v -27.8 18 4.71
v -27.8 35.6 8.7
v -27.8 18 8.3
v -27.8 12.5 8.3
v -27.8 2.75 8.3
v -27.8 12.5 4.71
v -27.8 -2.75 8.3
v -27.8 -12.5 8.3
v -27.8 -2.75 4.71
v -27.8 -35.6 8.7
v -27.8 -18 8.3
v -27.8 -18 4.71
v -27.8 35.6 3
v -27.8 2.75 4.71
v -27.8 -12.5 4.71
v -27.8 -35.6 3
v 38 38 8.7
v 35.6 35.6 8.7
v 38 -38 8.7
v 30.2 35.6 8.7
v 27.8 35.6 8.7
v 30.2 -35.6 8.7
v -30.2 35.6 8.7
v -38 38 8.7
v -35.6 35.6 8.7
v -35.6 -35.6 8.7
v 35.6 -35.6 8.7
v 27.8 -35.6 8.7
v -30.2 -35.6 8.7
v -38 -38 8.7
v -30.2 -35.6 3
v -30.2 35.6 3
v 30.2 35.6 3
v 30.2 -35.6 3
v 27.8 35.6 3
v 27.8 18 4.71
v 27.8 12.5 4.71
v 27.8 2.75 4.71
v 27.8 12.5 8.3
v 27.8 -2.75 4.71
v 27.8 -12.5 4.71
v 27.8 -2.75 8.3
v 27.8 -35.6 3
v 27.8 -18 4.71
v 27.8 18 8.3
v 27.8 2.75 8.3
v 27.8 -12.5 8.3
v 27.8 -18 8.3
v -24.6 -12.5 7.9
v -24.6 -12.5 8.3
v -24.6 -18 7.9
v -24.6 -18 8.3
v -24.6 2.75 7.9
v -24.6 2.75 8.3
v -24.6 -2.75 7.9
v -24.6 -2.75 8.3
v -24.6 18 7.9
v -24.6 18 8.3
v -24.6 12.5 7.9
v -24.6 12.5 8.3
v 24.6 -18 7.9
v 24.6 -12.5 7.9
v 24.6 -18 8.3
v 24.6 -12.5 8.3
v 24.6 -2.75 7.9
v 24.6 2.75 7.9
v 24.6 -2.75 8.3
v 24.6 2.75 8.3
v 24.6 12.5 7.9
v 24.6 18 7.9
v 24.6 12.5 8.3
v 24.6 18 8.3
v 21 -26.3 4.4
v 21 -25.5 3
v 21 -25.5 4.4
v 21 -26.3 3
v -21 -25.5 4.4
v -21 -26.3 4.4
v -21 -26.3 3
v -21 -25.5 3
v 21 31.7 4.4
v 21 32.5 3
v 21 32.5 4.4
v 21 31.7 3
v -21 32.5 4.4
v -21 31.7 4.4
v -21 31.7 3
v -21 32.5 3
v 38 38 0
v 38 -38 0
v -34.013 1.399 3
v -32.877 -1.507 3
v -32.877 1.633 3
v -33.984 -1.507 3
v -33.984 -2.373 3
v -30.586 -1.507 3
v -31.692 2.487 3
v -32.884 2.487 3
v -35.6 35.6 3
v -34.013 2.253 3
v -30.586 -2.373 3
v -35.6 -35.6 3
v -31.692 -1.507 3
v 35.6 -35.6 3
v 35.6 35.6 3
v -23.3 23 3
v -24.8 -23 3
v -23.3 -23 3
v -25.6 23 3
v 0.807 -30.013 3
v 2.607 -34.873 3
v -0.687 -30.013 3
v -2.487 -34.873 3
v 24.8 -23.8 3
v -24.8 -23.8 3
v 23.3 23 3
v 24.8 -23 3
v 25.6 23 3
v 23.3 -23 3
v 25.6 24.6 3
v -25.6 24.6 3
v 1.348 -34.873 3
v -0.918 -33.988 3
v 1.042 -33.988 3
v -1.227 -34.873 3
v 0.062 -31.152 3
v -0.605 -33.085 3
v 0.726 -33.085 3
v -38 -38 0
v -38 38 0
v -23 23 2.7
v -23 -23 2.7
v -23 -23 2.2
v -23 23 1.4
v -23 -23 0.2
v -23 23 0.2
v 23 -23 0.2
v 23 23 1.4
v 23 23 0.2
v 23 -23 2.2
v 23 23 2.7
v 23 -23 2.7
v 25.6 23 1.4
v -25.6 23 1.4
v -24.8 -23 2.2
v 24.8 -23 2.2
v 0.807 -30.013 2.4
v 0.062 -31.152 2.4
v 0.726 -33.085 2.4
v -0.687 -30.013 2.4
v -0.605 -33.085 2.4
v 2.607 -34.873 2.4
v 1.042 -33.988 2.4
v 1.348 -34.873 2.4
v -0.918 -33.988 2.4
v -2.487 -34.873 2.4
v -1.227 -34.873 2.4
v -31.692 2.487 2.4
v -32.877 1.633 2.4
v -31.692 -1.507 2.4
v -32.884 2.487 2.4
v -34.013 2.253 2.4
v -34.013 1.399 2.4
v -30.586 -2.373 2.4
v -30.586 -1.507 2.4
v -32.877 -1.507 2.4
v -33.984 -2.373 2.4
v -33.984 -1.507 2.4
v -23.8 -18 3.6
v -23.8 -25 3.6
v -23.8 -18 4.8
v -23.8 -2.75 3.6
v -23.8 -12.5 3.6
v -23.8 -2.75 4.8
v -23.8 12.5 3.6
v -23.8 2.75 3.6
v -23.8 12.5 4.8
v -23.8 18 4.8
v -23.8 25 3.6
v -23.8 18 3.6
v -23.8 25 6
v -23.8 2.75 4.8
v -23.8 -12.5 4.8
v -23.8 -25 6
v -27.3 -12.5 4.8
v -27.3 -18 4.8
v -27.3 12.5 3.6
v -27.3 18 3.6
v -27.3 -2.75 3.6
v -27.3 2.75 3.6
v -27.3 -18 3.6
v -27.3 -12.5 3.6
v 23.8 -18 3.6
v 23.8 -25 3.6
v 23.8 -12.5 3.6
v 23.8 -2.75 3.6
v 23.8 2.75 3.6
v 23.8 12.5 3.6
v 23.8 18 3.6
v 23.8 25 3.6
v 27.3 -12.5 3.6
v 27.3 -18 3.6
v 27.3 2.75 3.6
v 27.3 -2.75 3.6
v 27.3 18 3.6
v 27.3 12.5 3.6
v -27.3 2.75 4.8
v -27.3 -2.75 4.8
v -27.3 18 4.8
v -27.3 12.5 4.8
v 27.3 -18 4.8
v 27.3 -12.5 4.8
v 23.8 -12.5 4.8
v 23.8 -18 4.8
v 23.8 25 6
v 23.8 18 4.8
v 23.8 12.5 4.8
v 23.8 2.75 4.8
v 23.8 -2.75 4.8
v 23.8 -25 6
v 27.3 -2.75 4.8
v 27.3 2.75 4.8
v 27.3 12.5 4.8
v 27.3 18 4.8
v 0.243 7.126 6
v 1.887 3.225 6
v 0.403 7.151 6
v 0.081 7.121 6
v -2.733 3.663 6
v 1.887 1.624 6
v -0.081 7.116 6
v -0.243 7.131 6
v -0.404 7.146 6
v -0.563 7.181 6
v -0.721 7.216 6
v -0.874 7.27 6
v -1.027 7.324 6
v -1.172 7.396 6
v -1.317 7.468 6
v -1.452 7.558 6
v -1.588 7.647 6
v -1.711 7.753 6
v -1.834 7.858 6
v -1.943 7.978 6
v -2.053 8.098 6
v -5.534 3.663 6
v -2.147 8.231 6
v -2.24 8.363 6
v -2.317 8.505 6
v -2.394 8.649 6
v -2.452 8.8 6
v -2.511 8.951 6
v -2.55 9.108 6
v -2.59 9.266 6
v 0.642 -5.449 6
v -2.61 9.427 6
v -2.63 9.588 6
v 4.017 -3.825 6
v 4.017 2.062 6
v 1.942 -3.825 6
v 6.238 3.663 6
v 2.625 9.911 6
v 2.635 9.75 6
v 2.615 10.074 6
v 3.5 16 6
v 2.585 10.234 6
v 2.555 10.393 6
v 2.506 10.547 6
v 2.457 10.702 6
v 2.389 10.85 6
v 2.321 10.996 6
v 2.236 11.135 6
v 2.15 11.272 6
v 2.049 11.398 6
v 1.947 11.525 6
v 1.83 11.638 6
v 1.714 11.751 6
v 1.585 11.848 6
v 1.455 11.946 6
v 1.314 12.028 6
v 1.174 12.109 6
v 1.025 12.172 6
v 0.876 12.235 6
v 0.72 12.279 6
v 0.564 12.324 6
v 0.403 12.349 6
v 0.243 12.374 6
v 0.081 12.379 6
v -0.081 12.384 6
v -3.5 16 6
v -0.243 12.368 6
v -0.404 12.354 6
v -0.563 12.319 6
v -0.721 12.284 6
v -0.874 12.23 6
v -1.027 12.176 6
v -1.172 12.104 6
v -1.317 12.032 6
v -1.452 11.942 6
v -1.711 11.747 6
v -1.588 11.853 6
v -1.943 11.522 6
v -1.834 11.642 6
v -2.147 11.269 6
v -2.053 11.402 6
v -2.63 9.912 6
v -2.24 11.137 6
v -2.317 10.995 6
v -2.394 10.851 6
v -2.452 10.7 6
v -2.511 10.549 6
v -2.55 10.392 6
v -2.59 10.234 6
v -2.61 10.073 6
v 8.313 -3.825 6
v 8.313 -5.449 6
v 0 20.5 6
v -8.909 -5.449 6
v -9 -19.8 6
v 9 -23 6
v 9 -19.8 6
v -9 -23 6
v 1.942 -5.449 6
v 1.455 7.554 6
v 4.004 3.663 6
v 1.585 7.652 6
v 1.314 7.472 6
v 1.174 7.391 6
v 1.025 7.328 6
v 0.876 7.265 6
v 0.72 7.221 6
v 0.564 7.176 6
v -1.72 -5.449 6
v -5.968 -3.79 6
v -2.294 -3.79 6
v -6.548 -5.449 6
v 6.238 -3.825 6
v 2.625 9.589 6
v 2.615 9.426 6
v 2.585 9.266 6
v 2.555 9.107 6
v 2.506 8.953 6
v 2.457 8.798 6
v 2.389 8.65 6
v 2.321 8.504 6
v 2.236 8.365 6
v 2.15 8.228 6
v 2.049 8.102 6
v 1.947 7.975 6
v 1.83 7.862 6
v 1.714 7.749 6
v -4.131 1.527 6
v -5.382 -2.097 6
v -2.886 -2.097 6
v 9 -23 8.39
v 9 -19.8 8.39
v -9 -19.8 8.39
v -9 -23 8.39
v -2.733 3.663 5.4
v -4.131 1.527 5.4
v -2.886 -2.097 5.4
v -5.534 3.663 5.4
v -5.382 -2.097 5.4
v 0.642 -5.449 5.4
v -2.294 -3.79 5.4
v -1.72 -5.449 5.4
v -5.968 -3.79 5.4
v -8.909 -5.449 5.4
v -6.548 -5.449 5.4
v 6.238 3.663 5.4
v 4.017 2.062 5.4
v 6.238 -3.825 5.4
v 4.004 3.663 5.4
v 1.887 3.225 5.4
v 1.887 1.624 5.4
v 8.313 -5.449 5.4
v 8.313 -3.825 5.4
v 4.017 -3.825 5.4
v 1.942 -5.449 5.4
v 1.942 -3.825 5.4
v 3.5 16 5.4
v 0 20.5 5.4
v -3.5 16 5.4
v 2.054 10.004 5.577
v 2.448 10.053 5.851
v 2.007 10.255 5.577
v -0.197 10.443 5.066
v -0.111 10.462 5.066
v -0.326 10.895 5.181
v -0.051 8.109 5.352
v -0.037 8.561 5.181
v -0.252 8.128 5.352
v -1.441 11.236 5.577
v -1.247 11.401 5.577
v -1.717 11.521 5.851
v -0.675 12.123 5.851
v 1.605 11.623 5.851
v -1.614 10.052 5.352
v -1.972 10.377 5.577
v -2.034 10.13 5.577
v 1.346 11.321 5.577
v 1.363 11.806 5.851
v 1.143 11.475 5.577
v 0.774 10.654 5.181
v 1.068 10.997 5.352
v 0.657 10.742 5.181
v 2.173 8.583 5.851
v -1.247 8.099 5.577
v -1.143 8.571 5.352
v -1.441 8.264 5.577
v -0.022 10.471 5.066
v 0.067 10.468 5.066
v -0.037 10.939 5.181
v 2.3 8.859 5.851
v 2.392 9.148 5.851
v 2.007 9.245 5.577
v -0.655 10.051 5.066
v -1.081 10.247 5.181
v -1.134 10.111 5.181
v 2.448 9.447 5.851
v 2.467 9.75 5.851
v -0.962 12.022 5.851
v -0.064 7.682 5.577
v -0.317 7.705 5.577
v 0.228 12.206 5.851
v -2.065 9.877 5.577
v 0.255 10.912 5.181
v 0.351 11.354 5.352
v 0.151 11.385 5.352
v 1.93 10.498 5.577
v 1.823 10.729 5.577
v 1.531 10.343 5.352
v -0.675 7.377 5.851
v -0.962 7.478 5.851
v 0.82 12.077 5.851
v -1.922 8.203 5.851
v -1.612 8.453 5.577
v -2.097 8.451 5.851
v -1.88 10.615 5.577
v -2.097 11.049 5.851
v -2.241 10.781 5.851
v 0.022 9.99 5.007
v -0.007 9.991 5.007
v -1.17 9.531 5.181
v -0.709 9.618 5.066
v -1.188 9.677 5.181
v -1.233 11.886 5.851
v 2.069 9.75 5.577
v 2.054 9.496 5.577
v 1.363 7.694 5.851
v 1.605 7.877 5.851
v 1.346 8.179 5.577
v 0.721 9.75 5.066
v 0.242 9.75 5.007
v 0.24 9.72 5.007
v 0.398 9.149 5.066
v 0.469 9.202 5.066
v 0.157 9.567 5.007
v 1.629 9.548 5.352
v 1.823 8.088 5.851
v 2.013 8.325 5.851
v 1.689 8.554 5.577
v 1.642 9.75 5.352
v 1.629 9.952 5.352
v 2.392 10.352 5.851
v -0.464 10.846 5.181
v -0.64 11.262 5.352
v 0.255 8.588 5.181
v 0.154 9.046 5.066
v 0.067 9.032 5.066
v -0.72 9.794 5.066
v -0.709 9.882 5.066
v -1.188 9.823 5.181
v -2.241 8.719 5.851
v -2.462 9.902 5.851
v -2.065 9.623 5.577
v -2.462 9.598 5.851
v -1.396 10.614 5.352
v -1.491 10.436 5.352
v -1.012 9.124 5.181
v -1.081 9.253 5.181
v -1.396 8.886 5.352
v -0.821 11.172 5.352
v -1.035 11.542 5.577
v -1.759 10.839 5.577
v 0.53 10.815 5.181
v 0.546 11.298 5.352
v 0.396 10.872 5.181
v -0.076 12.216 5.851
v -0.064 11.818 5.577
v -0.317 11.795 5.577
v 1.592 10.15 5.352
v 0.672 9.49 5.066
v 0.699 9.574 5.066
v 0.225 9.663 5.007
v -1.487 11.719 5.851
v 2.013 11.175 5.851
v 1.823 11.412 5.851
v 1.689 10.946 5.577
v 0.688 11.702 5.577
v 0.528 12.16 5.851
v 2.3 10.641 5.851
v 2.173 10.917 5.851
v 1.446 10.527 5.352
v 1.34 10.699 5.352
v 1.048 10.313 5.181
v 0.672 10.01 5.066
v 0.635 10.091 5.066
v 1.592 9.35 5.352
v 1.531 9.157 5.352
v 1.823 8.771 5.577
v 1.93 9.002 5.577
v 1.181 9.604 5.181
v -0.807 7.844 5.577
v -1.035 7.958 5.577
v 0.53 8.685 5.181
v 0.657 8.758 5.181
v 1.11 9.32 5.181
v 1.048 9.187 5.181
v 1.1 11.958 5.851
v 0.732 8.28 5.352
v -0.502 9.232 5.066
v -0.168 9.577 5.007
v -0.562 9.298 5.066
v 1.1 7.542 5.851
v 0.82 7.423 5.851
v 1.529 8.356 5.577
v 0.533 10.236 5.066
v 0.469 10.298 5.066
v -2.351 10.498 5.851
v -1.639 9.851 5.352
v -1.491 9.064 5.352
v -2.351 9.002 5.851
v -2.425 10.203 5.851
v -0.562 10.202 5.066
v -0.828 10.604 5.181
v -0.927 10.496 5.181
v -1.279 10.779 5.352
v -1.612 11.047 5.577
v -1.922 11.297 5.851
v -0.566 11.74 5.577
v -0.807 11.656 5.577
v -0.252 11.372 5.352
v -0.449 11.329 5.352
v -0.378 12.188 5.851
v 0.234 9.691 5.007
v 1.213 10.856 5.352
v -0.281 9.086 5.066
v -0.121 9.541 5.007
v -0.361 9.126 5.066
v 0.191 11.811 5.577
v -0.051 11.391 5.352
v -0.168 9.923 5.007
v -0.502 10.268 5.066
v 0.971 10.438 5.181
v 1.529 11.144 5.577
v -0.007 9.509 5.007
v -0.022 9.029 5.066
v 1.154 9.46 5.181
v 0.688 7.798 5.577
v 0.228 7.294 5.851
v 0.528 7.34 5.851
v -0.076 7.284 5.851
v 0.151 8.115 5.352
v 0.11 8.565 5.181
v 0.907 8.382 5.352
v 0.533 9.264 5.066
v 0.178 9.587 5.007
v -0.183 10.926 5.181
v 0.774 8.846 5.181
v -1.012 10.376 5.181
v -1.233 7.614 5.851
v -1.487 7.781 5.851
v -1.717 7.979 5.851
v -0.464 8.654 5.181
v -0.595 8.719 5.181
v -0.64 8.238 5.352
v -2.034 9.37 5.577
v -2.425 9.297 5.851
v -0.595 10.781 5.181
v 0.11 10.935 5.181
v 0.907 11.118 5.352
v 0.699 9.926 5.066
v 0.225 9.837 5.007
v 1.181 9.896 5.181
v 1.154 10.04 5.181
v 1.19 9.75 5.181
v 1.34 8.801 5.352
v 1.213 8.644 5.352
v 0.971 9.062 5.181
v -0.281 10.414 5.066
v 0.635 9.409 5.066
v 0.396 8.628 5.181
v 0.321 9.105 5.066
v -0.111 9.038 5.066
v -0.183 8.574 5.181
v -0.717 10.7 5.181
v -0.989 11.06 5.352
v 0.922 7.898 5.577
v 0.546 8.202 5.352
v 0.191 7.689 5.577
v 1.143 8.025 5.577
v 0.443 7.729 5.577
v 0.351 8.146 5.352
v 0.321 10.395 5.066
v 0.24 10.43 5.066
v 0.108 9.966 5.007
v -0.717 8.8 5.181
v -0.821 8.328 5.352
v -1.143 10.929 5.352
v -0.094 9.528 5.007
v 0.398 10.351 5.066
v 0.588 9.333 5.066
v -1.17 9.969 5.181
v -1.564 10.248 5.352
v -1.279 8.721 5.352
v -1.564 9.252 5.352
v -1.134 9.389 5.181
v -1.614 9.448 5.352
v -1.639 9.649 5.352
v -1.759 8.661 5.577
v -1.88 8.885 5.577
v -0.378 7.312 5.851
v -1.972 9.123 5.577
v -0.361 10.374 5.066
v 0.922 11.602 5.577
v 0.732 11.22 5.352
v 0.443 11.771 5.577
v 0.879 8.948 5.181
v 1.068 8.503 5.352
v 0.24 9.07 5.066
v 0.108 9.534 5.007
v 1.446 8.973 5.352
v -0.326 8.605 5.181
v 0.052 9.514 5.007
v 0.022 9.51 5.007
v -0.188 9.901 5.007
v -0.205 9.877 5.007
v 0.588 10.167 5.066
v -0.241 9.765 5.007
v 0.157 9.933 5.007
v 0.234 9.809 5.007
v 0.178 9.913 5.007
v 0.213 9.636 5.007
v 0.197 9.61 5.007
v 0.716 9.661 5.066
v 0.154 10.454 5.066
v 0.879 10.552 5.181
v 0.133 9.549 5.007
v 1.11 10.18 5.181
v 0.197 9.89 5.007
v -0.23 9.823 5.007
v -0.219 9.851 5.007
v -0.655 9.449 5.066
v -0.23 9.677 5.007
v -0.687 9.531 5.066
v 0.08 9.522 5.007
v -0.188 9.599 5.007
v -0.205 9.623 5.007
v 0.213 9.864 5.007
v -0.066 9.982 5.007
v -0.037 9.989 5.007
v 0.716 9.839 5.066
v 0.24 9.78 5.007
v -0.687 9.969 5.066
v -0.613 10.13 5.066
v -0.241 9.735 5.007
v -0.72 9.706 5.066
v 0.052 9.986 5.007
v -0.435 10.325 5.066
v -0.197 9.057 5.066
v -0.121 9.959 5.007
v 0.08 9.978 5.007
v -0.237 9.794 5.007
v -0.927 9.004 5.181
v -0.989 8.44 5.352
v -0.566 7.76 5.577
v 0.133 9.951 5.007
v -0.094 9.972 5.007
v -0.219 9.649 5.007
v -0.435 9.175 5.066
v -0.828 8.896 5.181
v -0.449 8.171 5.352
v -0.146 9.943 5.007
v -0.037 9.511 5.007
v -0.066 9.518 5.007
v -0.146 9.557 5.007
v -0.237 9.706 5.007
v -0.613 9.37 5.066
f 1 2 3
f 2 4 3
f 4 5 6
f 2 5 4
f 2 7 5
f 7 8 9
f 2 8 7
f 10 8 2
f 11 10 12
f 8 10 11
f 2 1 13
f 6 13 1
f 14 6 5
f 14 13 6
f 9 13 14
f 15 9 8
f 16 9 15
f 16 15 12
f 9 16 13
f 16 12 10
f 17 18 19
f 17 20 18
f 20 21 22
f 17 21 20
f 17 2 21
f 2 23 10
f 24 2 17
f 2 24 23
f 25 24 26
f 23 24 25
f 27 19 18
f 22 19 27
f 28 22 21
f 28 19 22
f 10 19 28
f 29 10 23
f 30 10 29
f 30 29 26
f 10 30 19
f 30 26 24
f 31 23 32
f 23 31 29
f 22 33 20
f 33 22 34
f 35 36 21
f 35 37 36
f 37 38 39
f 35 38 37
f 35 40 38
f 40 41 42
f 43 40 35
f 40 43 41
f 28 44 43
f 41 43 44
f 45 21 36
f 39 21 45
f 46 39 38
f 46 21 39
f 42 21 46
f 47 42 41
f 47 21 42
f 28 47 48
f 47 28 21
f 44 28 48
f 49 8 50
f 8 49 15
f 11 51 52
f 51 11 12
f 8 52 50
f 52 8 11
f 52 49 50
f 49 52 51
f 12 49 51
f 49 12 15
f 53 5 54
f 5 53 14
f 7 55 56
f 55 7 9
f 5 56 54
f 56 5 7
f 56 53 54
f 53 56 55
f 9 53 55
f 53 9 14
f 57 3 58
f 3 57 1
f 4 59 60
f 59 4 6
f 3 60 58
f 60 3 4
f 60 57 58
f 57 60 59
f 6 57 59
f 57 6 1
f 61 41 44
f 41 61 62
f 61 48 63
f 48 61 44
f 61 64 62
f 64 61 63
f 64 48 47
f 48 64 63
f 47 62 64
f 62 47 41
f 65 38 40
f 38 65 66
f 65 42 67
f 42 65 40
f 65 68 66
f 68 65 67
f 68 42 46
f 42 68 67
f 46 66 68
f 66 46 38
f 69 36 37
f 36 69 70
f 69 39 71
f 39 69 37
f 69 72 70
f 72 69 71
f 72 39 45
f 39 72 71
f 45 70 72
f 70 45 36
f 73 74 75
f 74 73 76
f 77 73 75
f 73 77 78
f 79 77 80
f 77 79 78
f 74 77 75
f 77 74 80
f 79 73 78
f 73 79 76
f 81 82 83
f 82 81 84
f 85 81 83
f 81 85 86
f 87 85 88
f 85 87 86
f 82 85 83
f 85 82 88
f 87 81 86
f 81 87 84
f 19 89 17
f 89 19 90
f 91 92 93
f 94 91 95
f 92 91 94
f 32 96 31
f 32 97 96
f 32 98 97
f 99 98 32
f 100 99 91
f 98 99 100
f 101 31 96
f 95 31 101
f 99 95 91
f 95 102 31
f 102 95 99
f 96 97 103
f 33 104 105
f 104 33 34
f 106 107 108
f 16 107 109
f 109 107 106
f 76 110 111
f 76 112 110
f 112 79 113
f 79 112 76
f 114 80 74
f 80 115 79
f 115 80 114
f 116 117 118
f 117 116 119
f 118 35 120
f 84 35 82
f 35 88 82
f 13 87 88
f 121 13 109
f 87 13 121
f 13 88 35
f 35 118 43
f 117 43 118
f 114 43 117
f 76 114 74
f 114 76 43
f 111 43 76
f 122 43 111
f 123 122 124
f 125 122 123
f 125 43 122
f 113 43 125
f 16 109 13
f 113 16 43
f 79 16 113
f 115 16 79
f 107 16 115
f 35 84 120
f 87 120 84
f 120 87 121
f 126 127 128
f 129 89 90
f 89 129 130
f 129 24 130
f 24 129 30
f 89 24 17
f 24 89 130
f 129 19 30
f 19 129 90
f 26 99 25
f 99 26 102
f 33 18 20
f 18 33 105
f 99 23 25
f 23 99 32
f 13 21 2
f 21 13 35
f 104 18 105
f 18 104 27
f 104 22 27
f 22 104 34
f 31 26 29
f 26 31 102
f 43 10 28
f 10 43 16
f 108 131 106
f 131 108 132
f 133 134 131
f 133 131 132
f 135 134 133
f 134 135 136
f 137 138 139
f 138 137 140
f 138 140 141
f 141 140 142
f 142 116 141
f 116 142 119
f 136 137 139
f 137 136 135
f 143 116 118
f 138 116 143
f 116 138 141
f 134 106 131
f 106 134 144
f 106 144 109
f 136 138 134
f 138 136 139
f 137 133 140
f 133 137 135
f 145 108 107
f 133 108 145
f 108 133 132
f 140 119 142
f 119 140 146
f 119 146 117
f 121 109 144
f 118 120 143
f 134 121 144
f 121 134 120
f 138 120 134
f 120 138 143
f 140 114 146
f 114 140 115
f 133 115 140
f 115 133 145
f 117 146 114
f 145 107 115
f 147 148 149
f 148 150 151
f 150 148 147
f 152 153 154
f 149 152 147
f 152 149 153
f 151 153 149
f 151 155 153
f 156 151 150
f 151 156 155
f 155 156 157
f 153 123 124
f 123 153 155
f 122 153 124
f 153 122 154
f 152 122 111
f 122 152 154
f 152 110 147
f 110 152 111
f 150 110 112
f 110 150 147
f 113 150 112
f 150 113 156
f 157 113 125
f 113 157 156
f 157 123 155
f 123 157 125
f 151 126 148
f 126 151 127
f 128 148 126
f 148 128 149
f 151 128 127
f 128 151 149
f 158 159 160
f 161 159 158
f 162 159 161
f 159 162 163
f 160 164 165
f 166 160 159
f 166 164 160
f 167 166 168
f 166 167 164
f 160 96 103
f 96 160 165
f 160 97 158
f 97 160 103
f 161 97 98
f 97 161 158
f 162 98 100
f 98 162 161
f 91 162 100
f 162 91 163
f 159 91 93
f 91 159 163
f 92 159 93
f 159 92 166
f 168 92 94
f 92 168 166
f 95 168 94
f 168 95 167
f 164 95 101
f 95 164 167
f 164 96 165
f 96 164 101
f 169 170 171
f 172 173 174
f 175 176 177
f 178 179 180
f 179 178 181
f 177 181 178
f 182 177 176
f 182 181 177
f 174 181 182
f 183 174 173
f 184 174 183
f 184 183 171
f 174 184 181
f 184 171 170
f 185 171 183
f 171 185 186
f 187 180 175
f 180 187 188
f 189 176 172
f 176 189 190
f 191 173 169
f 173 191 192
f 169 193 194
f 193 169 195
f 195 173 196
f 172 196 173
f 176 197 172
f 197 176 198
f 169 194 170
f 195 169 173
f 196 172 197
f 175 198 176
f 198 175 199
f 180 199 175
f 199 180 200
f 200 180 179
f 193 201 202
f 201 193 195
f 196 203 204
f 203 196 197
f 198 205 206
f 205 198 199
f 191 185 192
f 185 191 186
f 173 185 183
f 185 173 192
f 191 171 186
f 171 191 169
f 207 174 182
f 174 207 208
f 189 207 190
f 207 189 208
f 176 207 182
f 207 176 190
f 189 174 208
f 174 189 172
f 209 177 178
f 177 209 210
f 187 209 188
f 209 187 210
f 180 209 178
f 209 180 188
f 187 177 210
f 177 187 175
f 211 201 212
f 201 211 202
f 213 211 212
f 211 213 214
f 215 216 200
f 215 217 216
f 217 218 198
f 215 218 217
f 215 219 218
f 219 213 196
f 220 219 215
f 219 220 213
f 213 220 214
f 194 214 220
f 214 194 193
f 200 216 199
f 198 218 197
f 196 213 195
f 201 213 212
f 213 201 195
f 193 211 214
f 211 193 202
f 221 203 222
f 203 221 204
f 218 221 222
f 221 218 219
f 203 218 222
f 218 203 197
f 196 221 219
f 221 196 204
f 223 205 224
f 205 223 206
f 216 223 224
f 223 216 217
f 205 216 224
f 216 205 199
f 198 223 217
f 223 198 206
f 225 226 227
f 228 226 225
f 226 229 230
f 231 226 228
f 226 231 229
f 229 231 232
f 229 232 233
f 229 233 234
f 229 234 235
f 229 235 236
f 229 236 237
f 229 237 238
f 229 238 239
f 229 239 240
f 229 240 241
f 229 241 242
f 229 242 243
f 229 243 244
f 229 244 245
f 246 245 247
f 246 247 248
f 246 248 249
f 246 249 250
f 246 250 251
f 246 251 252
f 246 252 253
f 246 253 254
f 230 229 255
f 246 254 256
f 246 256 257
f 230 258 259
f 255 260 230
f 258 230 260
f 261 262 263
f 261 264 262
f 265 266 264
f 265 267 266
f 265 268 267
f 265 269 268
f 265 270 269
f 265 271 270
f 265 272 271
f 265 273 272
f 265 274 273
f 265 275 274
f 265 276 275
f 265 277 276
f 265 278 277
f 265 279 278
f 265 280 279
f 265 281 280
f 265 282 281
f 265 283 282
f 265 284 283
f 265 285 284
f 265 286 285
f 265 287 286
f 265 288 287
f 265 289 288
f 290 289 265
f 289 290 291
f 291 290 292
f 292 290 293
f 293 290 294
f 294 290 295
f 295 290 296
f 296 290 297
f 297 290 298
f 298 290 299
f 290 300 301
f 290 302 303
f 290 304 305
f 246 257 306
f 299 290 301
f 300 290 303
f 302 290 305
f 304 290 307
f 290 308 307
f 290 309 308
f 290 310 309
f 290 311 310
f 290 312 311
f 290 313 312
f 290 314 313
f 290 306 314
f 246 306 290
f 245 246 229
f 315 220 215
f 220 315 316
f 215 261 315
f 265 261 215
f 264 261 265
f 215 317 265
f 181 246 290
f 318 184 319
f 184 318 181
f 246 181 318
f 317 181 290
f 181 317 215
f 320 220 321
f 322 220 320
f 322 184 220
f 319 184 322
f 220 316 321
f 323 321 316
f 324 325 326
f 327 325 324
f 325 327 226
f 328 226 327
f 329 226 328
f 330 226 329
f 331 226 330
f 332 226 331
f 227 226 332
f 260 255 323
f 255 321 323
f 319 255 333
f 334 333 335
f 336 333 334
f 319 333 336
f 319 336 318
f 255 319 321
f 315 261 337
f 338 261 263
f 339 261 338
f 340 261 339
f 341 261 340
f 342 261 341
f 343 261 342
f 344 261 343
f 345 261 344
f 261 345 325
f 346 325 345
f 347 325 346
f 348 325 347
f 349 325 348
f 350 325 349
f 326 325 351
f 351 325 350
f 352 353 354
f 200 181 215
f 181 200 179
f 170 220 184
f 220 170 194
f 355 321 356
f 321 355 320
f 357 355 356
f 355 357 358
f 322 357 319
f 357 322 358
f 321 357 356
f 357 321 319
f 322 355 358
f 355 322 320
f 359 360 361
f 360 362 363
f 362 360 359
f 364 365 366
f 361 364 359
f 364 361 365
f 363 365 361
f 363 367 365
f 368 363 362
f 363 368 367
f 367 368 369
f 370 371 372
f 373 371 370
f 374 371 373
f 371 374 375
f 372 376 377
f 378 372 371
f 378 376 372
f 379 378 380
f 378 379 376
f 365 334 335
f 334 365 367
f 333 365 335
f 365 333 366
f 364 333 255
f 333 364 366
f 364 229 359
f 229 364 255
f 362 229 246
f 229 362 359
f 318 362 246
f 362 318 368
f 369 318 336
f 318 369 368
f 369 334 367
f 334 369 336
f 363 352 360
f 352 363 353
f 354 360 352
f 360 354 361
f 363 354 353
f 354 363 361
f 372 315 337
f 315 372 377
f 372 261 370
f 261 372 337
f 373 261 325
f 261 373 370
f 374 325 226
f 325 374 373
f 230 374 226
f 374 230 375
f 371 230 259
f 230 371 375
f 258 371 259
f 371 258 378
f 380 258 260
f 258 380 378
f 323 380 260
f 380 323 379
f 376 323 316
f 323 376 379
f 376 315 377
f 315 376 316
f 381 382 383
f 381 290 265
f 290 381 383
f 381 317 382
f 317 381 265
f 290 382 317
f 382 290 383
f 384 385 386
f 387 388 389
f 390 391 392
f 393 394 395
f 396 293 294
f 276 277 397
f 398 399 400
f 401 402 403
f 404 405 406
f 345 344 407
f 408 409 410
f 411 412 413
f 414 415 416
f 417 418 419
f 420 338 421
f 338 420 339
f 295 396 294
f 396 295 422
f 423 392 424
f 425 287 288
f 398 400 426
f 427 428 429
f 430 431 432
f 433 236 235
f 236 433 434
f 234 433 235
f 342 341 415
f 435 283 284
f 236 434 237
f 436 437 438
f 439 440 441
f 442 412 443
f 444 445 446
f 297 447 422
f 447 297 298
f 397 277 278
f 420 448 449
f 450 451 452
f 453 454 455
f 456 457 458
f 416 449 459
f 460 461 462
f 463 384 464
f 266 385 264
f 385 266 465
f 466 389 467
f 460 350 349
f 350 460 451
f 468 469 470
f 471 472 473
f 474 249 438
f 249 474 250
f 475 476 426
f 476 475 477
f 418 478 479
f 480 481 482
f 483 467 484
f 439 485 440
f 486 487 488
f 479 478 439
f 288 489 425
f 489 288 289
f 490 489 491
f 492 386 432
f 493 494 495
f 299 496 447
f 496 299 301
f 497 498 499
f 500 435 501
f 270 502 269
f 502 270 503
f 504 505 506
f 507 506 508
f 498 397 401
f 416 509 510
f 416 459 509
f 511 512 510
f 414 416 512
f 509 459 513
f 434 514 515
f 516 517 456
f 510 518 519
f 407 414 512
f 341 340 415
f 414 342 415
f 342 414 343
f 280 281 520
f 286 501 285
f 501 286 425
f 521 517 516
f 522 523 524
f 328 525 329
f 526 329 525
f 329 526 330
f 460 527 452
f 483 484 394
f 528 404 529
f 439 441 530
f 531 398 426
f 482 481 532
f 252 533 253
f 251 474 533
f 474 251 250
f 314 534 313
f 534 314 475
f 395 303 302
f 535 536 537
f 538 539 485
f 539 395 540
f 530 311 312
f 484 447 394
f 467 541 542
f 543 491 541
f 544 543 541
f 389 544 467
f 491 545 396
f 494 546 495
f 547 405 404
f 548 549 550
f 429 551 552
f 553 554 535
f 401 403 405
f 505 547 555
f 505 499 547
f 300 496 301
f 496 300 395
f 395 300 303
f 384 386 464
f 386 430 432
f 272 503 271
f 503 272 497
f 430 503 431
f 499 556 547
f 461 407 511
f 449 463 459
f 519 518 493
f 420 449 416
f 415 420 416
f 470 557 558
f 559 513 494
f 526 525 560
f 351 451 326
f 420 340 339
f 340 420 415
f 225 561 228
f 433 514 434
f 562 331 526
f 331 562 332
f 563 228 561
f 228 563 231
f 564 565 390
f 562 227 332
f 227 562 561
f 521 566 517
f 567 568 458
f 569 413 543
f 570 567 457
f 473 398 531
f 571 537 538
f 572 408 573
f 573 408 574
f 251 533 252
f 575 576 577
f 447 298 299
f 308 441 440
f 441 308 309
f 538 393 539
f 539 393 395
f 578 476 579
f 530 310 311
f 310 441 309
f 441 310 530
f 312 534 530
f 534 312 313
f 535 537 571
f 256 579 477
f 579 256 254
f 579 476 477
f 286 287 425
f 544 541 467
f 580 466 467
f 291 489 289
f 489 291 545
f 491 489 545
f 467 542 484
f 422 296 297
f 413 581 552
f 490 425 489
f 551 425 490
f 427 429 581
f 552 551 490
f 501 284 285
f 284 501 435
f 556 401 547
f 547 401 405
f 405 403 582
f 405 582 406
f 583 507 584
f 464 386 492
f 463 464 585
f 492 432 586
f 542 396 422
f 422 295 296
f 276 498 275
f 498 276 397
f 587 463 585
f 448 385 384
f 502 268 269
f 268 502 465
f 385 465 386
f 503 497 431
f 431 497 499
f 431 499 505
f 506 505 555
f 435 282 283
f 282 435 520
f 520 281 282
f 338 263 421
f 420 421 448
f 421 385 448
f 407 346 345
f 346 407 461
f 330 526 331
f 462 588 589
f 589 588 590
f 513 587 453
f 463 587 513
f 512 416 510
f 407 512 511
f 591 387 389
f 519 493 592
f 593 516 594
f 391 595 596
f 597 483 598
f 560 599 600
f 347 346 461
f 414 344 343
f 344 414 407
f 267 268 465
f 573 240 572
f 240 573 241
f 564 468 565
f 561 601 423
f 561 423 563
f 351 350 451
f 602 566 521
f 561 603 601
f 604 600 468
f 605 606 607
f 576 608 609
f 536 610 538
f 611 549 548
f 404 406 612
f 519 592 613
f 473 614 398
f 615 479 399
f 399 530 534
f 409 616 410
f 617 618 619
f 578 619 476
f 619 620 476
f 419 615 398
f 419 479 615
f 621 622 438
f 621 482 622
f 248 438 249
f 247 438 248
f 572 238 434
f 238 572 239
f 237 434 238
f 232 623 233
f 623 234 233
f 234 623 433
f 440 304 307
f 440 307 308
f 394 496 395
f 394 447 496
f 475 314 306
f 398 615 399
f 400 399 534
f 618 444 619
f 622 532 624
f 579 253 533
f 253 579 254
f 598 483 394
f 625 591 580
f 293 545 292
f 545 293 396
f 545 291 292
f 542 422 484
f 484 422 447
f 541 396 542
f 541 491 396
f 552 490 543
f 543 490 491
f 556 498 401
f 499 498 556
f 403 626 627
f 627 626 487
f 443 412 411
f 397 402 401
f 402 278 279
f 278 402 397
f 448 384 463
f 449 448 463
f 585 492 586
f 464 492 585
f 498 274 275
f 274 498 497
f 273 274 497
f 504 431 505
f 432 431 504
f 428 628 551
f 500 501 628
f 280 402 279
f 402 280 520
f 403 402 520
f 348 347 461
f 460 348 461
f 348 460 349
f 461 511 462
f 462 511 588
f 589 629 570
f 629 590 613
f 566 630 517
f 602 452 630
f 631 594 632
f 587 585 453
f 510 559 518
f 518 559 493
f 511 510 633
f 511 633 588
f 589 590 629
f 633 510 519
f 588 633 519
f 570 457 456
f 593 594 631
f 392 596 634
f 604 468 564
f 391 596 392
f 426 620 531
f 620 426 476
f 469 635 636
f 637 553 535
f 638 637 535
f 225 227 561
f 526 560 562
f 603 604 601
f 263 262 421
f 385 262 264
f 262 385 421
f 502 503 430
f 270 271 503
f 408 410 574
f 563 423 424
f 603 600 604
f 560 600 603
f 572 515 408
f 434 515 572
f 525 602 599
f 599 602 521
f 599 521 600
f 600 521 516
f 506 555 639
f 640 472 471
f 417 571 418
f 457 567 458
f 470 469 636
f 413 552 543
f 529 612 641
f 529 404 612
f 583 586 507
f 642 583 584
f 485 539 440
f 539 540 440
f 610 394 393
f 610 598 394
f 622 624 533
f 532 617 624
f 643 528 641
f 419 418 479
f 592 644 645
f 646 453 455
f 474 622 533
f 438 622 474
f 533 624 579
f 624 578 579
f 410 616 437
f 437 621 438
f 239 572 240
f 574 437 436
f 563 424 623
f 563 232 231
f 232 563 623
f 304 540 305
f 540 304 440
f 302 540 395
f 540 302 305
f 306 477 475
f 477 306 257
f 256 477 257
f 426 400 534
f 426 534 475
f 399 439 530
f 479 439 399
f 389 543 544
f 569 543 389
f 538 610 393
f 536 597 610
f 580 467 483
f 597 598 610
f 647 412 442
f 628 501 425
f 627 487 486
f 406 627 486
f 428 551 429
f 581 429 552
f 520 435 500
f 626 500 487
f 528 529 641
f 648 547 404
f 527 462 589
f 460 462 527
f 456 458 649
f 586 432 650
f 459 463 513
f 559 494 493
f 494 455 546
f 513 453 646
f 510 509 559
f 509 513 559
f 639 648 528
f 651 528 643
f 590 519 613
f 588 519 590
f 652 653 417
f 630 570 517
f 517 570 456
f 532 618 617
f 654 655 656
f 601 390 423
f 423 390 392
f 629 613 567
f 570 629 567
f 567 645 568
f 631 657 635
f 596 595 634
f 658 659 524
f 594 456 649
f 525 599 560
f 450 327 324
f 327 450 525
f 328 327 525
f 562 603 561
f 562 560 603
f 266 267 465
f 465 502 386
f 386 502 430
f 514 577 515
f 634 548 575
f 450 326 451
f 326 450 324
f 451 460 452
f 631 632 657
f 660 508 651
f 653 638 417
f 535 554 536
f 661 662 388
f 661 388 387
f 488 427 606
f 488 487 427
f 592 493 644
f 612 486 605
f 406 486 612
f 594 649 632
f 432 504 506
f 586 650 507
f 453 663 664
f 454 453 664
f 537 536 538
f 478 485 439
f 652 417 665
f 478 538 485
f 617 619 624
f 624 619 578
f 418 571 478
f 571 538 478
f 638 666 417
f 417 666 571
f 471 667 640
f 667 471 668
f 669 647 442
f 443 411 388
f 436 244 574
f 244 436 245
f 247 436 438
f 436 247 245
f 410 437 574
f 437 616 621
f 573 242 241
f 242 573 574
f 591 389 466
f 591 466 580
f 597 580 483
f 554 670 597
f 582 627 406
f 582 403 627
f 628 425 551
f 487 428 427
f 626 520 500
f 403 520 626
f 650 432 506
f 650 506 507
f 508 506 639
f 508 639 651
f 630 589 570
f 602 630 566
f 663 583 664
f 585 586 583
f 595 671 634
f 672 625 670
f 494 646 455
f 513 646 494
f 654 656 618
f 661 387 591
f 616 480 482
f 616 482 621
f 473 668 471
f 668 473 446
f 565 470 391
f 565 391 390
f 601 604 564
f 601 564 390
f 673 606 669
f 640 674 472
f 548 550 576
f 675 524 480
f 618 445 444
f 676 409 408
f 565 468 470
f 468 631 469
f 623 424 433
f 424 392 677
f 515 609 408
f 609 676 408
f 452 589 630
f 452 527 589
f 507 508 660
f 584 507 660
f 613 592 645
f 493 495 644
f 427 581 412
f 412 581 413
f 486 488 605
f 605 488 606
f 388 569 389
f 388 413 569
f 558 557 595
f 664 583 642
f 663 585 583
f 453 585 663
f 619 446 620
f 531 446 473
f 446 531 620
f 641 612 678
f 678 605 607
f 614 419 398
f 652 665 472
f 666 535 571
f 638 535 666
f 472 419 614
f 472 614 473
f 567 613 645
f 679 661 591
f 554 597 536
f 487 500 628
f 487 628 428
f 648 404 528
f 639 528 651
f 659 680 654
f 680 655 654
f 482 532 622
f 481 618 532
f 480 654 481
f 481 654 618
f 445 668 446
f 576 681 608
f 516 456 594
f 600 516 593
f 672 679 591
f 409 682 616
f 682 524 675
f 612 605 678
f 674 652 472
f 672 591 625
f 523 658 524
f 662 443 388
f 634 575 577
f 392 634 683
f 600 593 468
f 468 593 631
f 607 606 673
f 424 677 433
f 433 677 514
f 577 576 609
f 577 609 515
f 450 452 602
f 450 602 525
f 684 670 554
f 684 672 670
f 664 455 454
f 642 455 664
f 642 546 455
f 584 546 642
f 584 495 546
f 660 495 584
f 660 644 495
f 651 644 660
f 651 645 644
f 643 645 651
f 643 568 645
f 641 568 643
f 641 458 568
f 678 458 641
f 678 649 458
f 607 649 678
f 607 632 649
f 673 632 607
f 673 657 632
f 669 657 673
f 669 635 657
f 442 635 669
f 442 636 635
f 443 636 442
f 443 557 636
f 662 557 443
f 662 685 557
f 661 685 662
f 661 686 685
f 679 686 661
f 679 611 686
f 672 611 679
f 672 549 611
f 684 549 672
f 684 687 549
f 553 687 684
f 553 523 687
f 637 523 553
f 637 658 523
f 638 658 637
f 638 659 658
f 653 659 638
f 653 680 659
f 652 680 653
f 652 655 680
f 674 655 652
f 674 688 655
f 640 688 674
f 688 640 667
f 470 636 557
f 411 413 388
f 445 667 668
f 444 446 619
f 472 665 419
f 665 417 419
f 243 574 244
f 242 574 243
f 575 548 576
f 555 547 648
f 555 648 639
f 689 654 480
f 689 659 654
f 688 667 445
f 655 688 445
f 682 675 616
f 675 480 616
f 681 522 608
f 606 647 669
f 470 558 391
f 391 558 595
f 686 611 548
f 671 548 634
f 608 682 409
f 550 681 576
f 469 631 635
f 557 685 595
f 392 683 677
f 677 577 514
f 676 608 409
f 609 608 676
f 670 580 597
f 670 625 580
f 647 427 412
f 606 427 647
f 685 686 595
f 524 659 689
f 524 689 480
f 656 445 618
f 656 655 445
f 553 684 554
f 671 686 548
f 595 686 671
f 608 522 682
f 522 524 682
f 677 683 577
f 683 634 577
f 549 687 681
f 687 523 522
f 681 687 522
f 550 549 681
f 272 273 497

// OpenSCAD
// file: sushi-battleship-tracker.scad
// sushi-battleship-tracker — shot-tracker refit of the archived
// sushi-battleship (frozen at v0.1): every print-in-place shutter door
// gains a shallow spherical miss-marker seat in its top face, so a called
// cell can be marked with a small round marker (dried soybean, 6 mm BB,
// peppercorn) instead of remembered.  Requirements and decisions: PM.md
// and NOTES.md next to this file.  All dimensions in millimeters.
//
// DERIVATIVE: the parent is included verbatim below and only door() is
// redefined; the parent's own call sites (lid_assembly) route to the
// redefinition, so the print-in-place top inherits the seat on all 16
// doors.  Lineage record: derives.conf; gate.sh proves each replaces:
// claim by mesh comparison (background: docs/derivative-designs.md).
//
// Fit surfaces — door body/tab dimensions, rails, lips, every clearance —
// are inherited untouched from the frozen parent (PM.md N1): the seat is
// a cut in the door's top face only, so a door_fit tuned on the parent's
// coupon transfers unchanged, and the refit adds zero height (N4).

include <../sushi-battleship/sushi-battleship.scad>

/* [Miss-marker seat] */
// mm, diameter of the roughly-spherical marker the seat is dished for
// (dried soybean ~7-9, 6 mm airsoft BB, peppercorn ~4-5)
marker_d = 8;
// mm, depth of the spherical seat cut into the door top face
seat_depth = 1.0;

/* [Hidden] */
assert(marker_d >= 4 && marker_d <= 10,
       "marker_d outside the practical 4-10 mm range the seat is designed for (peppercorn to large soybean)");
assert(seat_depth > 0 && seat_depth < marker_d/2,
       "seat_depth must be positive and shallower than the marker radius");
assert(door_t - seat_depth >= 1.2,
       "seat too deep: the door needs >= 1.2 mm of floor under the marker seat");

// ---- derived seat geometry ----
// contact-circle radius of a marker_d sphere sunk seat_depth into the face
seat_r  = sqrt((marker_d/2)*(marker_d/2)
             - (marker_d/2 - seat_depth)*(marker_d/2 - seat_depth));
// effective door length (the parent shrinks the body by door_fit per side)
dl_eff  = door_l - 2*door_fit;
// The seat sits centred in the free band between the engraved coordinate
// (size-9 text, valign=center at y=-1, so it spans to y=+3.5) and the
// engraved push arrow (base at y = dl_eff/2 - 9), in door-local coords.
seat_y  = ((dl_eff/2 - 9) + 3.5)/2;

assert((dl_eff/2 - 9) - (seat_y + seat_r) >= 0.8,
       "seat rim would run into the engraved push arrow; shrink marker_d or seat_depth");
assert((seat_y - seat_r) - 3.5 >= 0.8,
       "seat rim would run into the engraved coordinate; shrink marker_d or seat_depth");

echo(str("Marker seat: ", 2*seat_r, " mm opening, ", seat_depth,
         " mm deep, centred at door y=", seat_y));

// ============================================================
//  SHUTTER DOOR — replaces the parent's.  Body, tabs, grip bar and
//  engravings are restated verbatim (OpenSCAD has no way to extend a
//  module, and the parent is frozen so the restatement cannot drift);
//  the only delta is the spherical miss-marker seat.  The seat is a
//  dish cut from the top, so every layer's hole is wider than the one
//  below it: fully self-supporting in the print-in-place top.
// ============================================================
module door(label = "A1") {
    // door_fit shrinks (+) or grows (-) the door symmetrically; the
    // lid geometry never changes, so a re-tuned door stays a drop-in
    dw = door_w - 2*door_fit;      // effective body width
    dl = door_l - 2*door_fit;      // effective body length
    gw = min(18, dw - 10);         // grip bar width
    difference() {
        union() {
            // body
            translate([-dw/2, -dl/2, gap_z])
                cube([dw, dl, door_t]);
            // 3 locking tabs per side (bottom slab sticking out sideways)
            for (s = [-1, 1], c = [-tab_c, 0, tab_c])
                translate([s*dw/2 - (s < 0 ? tab_w : 0),
                           c - tab_len/2, gap_z])
                    cube([tab_w, tab_len, tab_t]);
            // grip bar near the front edge
            translate([-gw/2, -dl/2 + 2, gap_z + door_t - eps])
                cube([gw, 3.2, 2.4]);
        }
        // engraved coordinate
        translate([0, -1, gap_z + door_t - 0.6])
            linear_extrude(0.7)
                text(label, size = 9, halign = "center", valign = "center",
                     font = "DejaVu Sans:style=Bold");
        // engraved "push this way" arrow
        translate([0, dl/2 - 9, gap_z + door_t - 0.6])
            linear_extrude(0.7)
                polygon([[-3.5, 0], [3.5, 0], [0, 4.5]]);
        // miss-marker seat: a marker_d sphere sunk seat_depth into the
        // top face.  The rim edge is naturally obtuse (the sphere meets
        // the face at ~41 deg from vertical at the defaults), so no
        // extra edge break is needed and the marker self-centres.
        translate([0, seat_y, gap_z + door_t + marker_d/2 - seat_depth])
            sphere(d = marker_d);
    }
}
// main file
// Single-cell tracker coupon (PRINT THIS FIRST): the full production lid
// at grid 1x1 — one complete door with its rails, castellated lips,
// end-stop ridges, sacrificial membrane, window chamfers AND the
// miss-marker seat, straight from the production modules (nothing
// copied).  Tune door_fit in +-0.1 steps and sit your actual marker in
// the seat before committing to the full board; see NOTES.md.
include <sushi-battleship-tracker.scad>
grid_x = 1;
grid_y = 1;
part = "top";
